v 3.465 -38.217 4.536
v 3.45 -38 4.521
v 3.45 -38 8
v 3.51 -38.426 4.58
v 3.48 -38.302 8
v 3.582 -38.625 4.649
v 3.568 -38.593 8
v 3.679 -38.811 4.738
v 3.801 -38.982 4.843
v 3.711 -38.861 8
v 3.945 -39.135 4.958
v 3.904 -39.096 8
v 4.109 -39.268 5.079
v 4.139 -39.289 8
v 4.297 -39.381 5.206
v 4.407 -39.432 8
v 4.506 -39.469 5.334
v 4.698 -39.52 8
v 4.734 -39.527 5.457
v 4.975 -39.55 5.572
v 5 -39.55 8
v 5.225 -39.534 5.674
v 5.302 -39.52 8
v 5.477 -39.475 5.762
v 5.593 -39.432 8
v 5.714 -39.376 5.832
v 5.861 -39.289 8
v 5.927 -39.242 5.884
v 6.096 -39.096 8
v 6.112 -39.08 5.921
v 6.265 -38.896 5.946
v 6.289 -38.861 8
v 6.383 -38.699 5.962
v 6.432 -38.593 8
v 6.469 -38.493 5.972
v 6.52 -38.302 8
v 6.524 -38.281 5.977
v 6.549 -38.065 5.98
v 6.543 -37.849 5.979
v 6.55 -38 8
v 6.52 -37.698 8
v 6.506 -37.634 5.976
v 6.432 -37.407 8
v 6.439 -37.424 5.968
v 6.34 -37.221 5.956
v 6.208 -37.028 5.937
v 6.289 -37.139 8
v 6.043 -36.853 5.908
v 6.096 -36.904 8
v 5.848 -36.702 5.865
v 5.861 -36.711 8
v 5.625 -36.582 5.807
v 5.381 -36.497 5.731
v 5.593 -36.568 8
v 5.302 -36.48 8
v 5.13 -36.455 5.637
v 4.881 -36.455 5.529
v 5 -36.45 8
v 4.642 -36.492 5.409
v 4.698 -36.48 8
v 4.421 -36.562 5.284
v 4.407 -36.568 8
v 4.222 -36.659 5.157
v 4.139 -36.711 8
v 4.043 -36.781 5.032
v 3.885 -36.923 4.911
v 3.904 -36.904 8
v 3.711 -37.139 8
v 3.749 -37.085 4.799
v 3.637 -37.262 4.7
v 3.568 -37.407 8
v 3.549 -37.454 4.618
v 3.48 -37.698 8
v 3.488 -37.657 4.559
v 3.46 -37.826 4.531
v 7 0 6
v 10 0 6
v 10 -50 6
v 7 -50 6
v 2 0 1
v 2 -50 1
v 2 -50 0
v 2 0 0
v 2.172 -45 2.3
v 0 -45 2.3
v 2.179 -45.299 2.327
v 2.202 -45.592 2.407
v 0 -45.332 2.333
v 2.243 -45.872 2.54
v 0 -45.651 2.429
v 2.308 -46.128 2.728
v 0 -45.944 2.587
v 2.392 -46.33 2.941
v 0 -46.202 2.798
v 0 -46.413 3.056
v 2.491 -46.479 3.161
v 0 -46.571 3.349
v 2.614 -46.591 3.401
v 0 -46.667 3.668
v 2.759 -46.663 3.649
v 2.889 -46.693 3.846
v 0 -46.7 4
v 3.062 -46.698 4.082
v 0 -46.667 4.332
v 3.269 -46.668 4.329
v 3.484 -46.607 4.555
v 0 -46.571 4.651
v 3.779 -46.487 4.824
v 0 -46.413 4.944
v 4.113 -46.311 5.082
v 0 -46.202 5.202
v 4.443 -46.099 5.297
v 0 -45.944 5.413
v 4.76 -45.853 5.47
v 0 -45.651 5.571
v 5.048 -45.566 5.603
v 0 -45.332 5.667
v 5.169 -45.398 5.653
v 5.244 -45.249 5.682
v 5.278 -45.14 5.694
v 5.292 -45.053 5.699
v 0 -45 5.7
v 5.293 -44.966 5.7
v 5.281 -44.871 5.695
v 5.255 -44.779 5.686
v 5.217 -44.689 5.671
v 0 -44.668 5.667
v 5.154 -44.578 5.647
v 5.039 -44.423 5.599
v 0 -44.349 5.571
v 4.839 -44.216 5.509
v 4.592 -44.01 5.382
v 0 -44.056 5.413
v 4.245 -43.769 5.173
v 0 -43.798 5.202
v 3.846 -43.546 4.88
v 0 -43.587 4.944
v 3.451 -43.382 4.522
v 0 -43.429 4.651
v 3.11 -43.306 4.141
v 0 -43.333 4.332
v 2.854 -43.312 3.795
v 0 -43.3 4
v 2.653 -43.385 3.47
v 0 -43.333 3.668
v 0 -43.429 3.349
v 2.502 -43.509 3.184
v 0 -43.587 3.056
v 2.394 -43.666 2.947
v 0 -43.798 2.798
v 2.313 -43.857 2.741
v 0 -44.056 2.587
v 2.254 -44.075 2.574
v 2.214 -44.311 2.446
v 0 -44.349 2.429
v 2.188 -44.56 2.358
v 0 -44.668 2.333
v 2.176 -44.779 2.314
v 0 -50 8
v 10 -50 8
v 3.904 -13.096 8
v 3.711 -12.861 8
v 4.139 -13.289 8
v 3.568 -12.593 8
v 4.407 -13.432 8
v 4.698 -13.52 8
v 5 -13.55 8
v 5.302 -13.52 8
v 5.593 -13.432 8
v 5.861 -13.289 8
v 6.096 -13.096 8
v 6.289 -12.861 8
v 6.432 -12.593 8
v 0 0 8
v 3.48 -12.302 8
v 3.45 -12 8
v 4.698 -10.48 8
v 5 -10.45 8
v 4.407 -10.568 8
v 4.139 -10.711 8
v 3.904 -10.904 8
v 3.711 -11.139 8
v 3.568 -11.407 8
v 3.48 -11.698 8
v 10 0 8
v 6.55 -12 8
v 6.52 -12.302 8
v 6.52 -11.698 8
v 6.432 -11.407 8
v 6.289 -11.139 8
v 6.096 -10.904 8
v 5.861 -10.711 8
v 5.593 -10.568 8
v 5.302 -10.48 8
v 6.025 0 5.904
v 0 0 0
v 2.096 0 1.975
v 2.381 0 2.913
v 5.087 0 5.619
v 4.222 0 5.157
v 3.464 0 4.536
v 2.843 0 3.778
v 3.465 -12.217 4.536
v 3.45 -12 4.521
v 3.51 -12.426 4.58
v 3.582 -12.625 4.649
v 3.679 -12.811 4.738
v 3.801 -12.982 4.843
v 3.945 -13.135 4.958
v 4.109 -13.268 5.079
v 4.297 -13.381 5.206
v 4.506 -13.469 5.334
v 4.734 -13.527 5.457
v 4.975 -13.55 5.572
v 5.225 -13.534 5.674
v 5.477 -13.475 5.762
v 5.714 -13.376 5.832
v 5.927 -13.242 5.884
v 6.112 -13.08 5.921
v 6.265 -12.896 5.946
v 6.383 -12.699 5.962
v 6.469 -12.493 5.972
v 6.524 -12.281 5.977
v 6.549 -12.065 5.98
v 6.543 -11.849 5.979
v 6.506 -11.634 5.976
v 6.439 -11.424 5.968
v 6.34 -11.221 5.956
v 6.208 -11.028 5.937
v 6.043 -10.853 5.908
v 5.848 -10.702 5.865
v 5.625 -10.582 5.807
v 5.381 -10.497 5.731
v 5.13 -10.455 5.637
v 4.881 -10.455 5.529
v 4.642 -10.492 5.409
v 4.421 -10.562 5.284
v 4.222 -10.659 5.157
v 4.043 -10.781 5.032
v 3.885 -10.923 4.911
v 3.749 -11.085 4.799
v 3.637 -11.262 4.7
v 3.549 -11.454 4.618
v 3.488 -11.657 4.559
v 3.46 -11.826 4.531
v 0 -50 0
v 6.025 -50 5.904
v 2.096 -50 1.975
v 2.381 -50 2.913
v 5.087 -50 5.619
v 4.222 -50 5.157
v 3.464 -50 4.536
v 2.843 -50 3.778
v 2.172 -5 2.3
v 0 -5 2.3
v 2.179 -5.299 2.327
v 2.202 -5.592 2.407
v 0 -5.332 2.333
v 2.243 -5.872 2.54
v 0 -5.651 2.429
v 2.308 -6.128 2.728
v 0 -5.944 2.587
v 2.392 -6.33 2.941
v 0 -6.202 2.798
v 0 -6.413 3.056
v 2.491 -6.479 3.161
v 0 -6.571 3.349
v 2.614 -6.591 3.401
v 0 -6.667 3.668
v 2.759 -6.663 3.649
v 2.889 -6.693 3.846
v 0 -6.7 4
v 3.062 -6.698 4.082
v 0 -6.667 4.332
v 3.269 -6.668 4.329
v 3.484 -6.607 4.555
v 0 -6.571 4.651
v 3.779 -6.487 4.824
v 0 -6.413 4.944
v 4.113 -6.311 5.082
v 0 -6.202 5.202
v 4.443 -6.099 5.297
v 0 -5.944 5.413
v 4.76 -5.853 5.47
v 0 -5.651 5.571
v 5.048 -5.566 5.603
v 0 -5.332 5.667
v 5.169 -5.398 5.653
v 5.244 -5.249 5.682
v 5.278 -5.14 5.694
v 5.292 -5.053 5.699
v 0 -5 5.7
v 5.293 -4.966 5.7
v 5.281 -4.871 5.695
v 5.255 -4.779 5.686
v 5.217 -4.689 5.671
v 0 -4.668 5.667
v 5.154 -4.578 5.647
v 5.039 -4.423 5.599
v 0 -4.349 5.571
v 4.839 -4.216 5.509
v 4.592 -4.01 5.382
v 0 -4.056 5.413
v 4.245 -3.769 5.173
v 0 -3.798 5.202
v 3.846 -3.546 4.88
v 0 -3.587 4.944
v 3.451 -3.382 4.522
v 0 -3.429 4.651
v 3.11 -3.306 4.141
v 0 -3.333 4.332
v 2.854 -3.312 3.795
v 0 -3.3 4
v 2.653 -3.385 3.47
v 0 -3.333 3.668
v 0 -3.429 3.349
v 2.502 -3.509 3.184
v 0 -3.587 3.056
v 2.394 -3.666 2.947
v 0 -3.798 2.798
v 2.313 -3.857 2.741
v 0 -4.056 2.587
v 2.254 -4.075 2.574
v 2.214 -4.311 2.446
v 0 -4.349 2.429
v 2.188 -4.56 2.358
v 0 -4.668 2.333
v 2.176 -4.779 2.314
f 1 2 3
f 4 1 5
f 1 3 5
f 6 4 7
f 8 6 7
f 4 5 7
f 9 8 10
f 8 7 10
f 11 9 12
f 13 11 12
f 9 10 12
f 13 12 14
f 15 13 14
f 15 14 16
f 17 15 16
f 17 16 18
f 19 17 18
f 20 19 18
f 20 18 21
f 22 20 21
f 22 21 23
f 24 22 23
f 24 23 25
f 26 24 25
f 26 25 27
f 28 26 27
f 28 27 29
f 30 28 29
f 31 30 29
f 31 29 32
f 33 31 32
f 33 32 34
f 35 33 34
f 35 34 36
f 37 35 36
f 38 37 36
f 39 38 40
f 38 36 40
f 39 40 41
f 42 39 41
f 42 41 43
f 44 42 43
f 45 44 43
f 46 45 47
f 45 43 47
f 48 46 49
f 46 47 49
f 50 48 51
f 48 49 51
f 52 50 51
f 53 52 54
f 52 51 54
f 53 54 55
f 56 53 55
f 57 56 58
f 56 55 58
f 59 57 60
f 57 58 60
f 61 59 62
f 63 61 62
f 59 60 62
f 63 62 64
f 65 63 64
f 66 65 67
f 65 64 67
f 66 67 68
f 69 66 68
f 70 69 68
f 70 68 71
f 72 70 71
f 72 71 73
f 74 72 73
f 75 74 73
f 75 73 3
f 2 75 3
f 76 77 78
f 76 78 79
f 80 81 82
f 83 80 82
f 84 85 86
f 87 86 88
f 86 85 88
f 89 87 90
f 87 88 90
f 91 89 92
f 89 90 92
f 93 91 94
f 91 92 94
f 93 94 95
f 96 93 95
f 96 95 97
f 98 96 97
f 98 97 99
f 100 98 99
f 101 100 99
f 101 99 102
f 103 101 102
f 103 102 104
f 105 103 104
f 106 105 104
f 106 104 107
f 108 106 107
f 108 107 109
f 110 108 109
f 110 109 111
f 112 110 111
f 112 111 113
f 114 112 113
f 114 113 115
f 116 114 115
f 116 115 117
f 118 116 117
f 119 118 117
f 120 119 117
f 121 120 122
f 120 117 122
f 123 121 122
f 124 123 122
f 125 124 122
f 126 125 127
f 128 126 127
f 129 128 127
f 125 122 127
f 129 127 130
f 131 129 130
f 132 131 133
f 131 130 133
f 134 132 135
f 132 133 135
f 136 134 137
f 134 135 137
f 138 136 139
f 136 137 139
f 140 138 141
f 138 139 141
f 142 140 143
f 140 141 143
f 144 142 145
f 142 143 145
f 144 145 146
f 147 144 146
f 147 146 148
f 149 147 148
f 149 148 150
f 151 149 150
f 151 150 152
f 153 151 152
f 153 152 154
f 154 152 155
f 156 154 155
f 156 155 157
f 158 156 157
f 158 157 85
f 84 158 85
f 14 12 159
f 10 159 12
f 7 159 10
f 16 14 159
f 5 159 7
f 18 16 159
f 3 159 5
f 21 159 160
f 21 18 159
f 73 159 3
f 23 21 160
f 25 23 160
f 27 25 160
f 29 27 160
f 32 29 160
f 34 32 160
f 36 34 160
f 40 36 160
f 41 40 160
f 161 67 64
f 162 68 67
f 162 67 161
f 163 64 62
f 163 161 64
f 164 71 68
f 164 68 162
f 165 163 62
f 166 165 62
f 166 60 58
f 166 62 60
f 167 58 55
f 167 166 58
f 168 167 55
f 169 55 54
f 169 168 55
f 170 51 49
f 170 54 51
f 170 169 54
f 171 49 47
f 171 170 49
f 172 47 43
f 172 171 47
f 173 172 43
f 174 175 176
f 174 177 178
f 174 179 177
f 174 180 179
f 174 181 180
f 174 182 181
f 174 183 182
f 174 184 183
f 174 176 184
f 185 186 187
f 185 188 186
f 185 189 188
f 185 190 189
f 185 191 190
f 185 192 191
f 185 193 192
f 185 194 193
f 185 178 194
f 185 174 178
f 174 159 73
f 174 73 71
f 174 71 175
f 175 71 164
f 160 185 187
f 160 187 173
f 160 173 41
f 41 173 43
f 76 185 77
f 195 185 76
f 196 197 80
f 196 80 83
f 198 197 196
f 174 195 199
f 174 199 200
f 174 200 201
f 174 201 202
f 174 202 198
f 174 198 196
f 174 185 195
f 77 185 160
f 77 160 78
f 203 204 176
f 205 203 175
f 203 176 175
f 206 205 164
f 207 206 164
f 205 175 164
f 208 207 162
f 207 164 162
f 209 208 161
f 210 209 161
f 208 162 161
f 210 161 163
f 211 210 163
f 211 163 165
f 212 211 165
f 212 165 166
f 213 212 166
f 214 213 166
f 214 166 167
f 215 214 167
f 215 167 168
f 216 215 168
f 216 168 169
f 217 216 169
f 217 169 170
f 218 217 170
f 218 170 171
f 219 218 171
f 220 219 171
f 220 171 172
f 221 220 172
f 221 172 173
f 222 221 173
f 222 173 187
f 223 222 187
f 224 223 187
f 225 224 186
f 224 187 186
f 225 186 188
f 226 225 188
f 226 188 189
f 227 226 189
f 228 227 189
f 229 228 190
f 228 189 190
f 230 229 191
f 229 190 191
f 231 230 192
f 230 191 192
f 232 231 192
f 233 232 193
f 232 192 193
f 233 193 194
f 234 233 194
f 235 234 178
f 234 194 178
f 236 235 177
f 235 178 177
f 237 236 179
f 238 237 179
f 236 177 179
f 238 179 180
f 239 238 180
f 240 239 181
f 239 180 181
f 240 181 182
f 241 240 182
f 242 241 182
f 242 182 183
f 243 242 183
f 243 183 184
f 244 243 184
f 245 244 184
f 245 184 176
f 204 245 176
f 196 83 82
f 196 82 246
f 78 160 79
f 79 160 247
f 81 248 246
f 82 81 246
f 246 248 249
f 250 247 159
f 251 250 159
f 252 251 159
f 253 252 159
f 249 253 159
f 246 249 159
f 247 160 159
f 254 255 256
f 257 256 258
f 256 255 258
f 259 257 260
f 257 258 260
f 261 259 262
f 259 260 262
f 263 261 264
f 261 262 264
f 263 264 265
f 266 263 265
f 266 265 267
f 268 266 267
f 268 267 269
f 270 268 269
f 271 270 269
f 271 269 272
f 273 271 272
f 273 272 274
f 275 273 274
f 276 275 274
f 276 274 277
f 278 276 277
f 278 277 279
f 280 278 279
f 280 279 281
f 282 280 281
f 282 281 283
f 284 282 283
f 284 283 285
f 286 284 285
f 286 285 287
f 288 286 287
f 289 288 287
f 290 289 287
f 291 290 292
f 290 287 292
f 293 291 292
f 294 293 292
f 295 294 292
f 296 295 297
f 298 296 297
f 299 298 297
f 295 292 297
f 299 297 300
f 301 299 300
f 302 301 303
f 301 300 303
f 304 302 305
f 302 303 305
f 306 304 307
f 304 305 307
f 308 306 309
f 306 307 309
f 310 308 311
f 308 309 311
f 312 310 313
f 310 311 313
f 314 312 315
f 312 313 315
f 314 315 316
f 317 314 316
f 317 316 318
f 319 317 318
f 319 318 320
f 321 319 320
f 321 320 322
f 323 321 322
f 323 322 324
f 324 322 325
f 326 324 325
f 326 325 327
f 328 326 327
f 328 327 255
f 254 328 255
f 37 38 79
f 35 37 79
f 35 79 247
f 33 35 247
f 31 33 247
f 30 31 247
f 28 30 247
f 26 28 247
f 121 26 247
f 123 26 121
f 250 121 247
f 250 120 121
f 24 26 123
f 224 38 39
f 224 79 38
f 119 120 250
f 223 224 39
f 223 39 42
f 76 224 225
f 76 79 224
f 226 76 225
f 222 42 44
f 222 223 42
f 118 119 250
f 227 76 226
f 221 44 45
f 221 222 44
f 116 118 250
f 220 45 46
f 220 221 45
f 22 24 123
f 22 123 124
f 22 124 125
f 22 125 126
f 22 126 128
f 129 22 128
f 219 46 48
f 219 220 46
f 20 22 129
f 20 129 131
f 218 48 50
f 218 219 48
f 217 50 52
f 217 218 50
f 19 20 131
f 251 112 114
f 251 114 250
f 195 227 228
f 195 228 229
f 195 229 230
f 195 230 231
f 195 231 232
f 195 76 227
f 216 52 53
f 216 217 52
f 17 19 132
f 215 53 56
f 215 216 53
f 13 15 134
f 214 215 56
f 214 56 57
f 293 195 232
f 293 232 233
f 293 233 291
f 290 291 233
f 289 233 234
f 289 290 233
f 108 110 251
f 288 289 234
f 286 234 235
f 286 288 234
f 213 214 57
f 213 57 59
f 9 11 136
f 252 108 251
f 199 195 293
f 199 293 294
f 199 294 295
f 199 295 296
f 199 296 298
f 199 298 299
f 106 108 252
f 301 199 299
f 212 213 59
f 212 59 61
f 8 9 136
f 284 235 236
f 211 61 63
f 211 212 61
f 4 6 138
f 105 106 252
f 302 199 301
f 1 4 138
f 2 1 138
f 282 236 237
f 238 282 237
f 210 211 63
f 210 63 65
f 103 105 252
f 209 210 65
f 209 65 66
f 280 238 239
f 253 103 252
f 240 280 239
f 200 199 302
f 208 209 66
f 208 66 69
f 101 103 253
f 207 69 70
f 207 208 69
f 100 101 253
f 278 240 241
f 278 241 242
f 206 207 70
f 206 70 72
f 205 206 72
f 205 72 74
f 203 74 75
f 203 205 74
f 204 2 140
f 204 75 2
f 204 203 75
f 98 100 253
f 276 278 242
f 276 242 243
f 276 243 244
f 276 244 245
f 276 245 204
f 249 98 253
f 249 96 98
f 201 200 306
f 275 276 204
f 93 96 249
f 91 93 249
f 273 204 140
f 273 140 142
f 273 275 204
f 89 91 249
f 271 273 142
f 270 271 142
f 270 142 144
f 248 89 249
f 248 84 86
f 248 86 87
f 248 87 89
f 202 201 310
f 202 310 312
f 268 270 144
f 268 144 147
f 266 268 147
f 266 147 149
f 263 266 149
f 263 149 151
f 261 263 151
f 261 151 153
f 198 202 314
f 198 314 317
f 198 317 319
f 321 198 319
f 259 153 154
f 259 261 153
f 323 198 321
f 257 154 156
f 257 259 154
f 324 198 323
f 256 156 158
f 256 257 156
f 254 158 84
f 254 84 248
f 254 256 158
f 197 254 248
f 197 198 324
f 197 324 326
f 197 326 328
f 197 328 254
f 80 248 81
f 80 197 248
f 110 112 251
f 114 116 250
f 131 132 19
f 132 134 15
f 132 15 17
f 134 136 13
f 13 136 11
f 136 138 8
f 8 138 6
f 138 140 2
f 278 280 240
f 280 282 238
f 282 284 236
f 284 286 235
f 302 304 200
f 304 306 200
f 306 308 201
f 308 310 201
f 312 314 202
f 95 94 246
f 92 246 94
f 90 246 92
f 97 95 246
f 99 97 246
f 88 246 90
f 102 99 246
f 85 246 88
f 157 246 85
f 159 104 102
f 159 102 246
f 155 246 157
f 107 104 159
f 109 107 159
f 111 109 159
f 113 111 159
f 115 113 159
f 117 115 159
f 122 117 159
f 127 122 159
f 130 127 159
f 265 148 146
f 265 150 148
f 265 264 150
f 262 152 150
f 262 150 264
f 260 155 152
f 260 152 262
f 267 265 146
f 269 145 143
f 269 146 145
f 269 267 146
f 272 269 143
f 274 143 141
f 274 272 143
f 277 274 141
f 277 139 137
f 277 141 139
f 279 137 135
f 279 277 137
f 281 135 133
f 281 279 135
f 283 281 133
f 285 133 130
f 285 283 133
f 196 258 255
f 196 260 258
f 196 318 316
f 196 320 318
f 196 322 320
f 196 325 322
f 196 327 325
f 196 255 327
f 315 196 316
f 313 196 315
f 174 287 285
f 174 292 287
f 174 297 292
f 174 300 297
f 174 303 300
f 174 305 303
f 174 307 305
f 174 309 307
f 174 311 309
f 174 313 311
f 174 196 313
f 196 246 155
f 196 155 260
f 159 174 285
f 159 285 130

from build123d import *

# Parameters (mm, degrees)
PAD_DEPTH       = 50
SKETCH001_R     = 1.7
POCKET_DEPTH    = 10.001
SKETCH003_R     = 1.55
POCKET001_DEPTH = 8.001


with BuildPart() as part:
    # Sketch → Pad (new body)
    with BuildSketch(Plane.XZ):
        with BuildLine():
            Line((0, 0), (0, 8))
            Line((0, 8), (10, 8))
            Line((10, 8), (10, 6))
            Line((10, 6), (7, 6))
            ThreePointArc((7, 6), (3.464466, 4.535534), (2, 1))
            Line((2, 1), (2, 0))
            Line((2, 0), (0, 0))
        make_face()
    extrude(amount=PAD_DEPTH)

    # Sketch001 (on Face1 of Pad) → Pocket (cut, through all)
    with BuildSketch(Plane(origin=(0, 0, 0), x_dir=(0, 0, -1), z_dir=(-1, 0, 0))):
        with Locations((-4, 5)):
            Circle(SKETCH001_R)
        with Locations((-4, 45)):
            Circle(SKETCH001_R)
    extrude(amount=-POCKET_DEPTH, mode=Mode.SUBTRACT)

    # Sketch003 (on Face5 of Pocket) → Pocket001 (cut, through all)
    with BuildSketch(Plane(origin=(0, 0, 8), x_dir=(-1, 0, 0), z_dir=(0, 0, 1))):
        with Locations((-5, 38)):
            Circle(SKETCH003_R)
        with Locations((-5, 12)):
            Circle(SKETCH003_R)
    extrude(amount=-POCKET001_DEPTH, mode=Mode.SUBTRACT)


solid = part.part
